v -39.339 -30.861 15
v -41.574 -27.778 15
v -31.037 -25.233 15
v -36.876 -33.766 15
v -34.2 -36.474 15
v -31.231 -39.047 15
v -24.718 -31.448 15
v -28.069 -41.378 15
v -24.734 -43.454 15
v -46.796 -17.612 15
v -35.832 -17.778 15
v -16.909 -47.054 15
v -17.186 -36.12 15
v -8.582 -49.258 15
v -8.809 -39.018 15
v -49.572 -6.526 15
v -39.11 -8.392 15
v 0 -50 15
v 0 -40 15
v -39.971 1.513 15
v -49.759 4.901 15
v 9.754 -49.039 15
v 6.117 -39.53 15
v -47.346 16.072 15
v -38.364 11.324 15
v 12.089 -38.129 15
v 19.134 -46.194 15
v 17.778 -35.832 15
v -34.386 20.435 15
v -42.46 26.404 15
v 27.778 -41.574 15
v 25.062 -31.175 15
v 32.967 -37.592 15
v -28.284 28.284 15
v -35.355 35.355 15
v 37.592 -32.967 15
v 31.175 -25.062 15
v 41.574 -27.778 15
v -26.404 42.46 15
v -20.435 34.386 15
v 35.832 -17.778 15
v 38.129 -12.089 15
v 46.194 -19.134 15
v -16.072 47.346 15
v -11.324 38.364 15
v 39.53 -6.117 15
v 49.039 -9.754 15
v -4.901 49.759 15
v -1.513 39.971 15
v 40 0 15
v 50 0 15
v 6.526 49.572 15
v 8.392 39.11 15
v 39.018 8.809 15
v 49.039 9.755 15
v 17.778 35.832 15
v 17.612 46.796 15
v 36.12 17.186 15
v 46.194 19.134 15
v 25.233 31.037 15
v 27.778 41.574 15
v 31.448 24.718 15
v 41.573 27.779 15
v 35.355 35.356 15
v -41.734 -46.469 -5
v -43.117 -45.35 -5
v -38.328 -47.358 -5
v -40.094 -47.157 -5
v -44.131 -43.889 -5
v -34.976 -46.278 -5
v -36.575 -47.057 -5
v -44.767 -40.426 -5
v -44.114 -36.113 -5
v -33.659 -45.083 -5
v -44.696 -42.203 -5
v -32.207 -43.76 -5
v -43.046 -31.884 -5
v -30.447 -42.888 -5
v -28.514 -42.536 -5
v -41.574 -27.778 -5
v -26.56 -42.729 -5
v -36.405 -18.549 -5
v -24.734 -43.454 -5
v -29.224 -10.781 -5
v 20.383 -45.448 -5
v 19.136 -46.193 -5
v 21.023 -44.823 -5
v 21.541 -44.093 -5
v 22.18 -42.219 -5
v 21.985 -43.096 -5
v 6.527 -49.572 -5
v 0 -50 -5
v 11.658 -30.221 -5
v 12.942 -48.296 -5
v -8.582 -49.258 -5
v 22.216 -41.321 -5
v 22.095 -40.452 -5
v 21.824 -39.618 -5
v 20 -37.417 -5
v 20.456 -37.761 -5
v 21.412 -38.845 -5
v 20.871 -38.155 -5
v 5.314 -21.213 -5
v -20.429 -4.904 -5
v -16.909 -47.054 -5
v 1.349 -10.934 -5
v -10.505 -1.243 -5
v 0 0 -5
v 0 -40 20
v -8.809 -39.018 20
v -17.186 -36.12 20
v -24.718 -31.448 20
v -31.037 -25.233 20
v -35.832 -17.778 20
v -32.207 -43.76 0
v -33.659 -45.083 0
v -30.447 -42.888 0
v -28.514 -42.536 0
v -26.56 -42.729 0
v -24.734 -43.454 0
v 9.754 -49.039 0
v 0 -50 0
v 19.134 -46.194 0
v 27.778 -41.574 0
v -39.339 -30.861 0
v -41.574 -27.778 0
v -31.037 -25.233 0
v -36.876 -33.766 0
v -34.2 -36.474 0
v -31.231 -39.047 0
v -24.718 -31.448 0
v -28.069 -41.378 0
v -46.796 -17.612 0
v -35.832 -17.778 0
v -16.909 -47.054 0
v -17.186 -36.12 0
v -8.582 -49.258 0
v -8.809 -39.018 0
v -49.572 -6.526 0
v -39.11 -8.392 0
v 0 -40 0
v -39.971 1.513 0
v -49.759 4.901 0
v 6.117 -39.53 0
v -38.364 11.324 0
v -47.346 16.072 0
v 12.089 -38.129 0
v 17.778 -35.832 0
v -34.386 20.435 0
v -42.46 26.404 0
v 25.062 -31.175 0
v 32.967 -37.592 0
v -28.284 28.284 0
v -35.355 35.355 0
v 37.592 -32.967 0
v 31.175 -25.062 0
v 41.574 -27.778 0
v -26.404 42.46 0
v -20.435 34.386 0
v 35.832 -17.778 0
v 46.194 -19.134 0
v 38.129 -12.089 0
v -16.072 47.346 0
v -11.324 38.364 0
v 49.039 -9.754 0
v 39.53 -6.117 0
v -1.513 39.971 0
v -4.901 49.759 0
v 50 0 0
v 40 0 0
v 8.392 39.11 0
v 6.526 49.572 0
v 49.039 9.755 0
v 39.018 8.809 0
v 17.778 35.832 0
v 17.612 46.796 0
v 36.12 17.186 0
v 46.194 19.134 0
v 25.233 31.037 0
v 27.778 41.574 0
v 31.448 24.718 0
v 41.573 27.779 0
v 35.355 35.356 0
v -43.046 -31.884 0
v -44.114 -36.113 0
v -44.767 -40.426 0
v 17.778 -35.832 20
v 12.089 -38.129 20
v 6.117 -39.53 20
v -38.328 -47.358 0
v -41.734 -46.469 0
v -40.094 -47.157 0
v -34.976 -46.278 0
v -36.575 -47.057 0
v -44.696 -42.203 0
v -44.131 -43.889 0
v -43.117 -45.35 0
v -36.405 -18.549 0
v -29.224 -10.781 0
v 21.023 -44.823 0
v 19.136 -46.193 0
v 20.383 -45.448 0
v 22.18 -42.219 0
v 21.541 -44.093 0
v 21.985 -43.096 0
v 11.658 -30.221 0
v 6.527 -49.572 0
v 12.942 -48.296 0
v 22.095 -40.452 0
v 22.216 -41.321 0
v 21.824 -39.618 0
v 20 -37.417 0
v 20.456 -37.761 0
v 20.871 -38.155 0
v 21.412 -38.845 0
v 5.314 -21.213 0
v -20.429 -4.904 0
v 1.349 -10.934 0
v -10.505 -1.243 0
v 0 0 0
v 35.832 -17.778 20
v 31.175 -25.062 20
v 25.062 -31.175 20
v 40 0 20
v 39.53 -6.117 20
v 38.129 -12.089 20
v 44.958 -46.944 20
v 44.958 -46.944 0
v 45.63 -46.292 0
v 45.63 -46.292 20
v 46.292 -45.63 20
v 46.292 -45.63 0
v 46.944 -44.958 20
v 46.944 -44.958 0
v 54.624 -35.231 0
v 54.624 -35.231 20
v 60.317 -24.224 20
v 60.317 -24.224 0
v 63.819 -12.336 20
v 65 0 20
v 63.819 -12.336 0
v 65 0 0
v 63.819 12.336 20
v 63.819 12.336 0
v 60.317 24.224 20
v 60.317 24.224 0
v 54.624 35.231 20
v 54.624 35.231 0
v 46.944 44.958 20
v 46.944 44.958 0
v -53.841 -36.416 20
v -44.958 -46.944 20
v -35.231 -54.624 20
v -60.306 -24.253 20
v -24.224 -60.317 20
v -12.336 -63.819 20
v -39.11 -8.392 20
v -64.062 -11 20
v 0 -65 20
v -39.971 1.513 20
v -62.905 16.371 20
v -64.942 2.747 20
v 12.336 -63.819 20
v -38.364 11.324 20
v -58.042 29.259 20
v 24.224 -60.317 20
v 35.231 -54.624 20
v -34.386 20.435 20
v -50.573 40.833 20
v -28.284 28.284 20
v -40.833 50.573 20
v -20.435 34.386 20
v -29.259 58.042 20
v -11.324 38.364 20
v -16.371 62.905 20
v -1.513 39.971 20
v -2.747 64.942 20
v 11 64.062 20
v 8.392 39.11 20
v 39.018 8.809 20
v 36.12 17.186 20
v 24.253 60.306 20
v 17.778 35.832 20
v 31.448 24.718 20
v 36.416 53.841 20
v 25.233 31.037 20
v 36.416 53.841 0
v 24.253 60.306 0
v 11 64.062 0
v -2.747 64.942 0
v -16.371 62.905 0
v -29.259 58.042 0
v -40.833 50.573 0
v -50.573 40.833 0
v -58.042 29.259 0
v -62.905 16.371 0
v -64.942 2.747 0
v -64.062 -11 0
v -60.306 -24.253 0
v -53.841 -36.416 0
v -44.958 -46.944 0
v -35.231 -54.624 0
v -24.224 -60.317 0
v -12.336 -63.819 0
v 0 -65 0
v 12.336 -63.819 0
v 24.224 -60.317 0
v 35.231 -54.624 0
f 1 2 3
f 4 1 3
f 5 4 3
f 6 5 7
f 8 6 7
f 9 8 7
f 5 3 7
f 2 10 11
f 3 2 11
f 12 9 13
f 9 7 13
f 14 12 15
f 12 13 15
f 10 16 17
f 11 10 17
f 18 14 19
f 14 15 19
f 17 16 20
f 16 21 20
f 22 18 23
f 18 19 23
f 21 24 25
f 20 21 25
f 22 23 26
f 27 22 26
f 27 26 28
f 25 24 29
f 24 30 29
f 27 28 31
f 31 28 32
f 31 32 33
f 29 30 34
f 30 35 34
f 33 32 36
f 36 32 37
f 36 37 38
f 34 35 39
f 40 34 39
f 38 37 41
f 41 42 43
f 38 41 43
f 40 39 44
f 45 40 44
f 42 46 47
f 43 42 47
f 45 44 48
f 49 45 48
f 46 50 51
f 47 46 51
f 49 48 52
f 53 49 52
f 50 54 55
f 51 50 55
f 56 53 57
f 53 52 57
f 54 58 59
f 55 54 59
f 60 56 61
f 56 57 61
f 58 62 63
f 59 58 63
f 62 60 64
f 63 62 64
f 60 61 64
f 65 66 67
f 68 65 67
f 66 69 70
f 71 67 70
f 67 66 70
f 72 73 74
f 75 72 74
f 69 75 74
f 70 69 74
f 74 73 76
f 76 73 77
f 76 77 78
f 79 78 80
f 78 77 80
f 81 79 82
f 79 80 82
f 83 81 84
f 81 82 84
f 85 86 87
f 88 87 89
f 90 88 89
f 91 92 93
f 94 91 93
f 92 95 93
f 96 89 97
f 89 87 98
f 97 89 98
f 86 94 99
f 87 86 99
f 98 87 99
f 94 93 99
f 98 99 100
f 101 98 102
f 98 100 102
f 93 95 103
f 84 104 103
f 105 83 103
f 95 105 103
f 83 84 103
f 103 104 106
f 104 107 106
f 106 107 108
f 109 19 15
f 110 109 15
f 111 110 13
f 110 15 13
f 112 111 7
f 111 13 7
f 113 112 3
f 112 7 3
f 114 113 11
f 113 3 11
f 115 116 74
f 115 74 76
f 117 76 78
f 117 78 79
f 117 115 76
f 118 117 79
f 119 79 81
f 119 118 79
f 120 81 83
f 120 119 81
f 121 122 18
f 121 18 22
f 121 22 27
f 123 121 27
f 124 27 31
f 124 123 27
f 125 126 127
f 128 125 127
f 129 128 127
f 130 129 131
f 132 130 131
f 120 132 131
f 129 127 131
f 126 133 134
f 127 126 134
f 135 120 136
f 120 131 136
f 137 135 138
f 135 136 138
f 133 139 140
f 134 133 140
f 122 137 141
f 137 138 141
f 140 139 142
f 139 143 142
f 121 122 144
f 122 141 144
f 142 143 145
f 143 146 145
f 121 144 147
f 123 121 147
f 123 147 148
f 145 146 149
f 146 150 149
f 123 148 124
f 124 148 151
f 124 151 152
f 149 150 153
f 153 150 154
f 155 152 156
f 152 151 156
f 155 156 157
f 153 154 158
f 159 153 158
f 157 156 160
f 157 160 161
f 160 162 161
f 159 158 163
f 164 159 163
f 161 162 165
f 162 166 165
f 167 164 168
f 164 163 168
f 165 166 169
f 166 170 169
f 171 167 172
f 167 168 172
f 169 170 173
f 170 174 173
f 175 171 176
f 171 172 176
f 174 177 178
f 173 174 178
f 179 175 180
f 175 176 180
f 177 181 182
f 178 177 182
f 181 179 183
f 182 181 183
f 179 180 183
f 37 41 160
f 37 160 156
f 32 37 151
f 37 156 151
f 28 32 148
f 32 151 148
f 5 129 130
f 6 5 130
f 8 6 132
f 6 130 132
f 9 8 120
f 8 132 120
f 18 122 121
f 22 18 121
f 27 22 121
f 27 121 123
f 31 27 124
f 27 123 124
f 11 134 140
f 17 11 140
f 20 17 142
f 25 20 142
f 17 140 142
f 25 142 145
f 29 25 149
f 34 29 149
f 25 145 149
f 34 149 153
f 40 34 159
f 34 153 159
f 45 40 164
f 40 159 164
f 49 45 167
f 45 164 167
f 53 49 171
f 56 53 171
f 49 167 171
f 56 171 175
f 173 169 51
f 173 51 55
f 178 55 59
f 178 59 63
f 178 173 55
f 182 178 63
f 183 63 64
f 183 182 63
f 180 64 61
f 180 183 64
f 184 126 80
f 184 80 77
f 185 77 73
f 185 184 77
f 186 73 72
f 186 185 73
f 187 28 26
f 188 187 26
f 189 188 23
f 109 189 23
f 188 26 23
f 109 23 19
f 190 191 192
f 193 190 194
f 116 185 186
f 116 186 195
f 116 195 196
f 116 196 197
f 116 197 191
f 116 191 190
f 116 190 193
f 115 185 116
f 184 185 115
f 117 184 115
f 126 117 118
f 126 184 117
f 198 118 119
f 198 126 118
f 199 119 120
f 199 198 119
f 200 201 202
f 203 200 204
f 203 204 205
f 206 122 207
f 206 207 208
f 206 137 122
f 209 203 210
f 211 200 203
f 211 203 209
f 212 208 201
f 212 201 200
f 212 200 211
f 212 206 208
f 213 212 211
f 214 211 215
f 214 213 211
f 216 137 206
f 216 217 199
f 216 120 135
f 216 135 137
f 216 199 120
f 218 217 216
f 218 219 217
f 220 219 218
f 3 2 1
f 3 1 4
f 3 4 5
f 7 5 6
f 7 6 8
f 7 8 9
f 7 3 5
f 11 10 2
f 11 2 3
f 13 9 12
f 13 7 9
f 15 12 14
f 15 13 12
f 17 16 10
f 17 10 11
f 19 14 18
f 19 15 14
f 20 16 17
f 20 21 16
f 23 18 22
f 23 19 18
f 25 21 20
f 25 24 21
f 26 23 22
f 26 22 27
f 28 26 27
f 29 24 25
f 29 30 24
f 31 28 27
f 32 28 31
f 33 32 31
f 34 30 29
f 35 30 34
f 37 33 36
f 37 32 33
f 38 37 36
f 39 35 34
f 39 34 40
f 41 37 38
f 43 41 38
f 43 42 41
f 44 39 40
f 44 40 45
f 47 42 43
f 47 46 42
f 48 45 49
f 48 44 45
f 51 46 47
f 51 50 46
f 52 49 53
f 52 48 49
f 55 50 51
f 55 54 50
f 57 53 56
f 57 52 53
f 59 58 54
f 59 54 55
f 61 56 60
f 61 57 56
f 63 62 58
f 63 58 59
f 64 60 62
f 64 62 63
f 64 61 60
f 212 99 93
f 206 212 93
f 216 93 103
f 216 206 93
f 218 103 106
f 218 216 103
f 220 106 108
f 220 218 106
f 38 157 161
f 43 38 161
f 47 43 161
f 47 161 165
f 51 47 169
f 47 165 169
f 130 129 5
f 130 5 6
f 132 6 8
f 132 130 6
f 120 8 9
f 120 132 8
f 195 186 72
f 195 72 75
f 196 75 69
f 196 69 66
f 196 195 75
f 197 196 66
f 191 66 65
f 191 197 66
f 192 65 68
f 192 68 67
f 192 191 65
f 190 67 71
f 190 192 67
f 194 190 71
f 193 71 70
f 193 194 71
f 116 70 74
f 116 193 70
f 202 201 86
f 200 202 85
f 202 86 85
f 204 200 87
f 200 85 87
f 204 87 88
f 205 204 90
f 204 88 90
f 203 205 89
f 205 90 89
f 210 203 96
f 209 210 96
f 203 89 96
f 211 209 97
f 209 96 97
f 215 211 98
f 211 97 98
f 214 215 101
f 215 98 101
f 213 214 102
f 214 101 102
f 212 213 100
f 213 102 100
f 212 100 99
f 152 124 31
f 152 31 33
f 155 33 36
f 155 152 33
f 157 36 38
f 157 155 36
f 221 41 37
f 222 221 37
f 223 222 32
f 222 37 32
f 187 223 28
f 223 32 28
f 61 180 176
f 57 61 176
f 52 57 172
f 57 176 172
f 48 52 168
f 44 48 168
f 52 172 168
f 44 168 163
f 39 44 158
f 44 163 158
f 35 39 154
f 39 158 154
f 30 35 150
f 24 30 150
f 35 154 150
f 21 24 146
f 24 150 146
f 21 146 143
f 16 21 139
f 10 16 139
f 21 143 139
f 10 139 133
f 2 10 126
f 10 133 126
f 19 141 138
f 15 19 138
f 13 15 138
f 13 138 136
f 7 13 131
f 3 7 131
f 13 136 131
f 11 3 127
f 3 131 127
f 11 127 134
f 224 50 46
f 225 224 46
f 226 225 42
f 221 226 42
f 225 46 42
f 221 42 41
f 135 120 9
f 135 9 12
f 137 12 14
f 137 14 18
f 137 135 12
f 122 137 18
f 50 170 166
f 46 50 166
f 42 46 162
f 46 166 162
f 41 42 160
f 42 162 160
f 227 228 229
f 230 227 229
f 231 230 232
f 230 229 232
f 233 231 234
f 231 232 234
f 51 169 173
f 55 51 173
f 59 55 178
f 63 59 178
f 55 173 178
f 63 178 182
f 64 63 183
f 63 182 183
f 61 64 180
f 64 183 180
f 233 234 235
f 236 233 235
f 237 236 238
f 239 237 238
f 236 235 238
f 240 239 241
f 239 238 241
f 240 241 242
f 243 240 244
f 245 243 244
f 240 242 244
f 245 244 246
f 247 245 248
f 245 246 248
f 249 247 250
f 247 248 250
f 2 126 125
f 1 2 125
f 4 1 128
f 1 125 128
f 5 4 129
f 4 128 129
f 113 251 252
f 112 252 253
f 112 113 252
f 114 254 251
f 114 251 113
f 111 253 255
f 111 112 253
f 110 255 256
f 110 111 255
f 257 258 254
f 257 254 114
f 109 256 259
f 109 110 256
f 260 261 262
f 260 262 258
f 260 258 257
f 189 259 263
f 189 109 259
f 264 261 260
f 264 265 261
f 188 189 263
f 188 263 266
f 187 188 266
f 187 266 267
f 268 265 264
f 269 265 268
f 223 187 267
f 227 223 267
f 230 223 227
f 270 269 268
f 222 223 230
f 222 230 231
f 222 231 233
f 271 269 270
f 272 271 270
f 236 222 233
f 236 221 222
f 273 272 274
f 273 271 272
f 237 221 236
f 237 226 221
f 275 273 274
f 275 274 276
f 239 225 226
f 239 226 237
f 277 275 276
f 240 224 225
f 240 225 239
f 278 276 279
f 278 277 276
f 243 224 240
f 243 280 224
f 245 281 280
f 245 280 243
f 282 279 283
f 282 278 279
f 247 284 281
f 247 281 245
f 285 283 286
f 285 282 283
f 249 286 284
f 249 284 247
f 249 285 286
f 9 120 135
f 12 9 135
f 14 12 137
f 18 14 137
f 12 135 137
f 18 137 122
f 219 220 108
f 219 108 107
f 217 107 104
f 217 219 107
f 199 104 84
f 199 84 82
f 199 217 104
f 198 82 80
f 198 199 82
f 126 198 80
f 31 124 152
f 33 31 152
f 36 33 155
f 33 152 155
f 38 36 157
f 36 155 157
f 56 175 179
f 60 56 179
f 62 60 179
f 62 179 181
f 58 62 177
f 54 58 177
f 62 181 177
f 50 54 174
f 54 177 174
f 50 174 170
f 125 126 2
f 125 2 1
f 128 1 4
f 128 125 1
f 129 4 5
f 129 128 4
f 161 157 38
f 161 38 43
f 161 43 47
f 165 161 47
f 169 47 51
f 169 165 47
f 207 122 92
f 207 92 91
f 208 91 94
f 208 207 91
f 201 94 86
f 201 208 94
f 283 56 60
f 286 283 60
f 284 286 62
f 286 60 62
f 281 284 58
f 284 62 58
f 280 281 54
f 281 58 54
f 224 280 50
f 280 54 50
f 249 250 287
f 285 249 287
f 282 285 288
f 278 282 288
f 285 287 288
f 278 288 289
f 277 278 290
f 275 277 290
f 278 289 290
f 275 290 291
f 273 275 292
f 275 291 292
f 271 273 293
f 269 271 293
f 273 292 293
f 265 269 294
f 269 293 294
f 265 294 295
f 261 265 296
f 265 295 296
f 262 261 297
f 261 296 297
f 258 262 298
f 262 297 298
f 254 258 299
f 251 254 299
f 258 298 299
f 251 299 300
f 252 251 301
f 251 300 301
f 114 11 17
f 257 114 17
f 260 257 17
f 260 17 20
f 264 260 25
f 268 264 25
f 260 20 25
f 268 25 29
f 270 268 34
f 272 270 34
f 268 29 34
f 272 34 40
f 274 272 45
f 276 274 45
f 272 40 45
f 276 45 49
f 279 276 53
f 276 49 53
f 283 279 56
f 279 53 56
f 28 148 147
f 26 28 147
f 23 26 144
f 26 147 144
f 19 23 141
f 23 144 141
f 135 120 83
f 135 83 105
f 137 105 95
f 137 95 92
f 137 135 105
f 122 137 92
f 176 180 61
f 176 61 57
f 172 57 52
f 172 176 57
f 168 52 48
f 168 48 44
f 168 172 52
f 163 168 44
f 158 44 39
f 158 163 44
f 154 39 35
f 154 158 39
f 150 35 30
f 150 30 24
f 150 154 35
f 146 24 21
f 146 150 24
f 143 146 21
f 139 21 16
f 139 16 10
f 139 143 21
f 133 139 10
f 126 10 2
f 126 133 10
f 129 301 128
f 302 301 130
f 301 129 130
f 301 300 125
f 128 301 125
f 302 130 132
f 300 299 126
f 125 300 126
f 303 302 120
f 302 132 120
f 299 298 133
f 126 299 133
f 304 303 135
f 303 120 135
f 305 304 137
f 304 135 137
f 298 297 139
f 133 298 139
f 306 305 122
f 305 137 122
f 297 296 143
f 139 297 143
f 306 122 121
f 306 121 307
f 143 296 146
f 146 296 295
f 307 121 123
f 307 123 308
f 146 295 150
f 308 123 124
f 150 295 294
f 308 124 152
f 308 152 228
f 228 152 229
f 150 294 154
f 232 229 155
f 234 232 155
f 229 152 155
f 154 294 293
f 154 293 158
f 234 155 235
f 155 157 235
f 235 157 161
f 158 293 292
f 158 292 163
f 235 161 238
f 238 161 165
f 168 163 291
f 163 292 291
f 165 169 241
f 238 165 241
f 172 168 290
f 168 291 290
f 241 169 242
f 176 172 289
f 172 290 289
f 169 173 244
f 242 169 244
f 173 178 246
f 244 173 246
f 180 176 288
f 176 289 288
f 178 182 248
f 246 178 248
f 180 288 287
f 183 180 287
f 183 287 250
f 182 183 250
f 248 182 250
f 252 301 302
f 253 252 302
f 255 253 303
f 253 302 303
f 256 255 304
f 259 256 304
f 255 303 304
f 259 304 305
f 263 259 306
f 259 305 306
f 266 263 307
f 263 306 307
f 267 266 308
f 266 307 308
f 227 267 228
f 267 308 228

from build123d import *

# Parameters (mm, degrees)
F1_DEPTH = 20
F2_DEPTH = 15
F3_DEPTH = 15
F4_DEPTH = 5
F5_R     = 5


# Not quite as in the source:
# - a feature names something its author has since deleted; it is built from what else it names


with BuildPart() as f1:
    # F0 (on Top) → F1 (new body)
    with BuildSketch(Plane.XY):
        with BuildLine():
            ThreePointArc((-41.5739709642, -27.7777777778), (-35.3553390593, 35.3553390593), (27.7777777778, 41.5739709642))
            ThreePointArc((27.7777777778, 41.5739709642), (37.1759673359, 44.3146083461), (46.9444444444, 44.9579707705))
            ThreePointArc((46.9444444444, 44.9579707705), (-45.9619407771, 45.9619407771), (-44.9579707705, -46.9444444444))
            ThreePointArc((-44.9579707705, -46.9444444444), (-44.9806919732, -43.6819144147), (-44.7669675939, -40.426313036))
            ThreePointArc((-44.7669675939, -40.426313036), (-43.6312477339, -33.9857264796), (-41.5739709642, -27.7777777778))
        make_face()
        with BuildLine():
            ThreePointArc((45, -45), (36.220156419, -44.1351826403), (27.7777777778, -41.5739709642))
            ThreePointArc((27.7777777778, -41.5739709642), (14.5138115564, -47.8471448898), (0, -50))
            ThreePointArc((0, -50), (-12.7926961833, -48.3357727192), (-24.7337942073, -43.4538769745))
            ThreePointArc((-24.7337942073, -43.4538769745), (-29.4930498897, -42.6445374906), (-33.6593211472, -45.0833340912))
            ThreePointArc((-33.6593211472, -45.0833340912), (-40.9388886222, -46.870964929), (-44.7669675939, -40.426313036))
            ThreePointArc((-44.7669675939, -40.426313036), (-44.9806919732, -43.6819144147), (-44.9579707705, -46.9444444444))
            ThreePointArc((-44.9579707705, -46.9444444444), (0, -65), (44.9579707705, -46.9444444444))
            ThreePointArc((44.9579707705, -46.9444444444), (44.9894914656, -45.9724493115), (45, -45))
        make_face()
        with BuildLine():
            ThreePointArc((27.7777777778, 41.5739709642), (44.0958551844, 23.5702260396), (50, 0))
            ThreePointArc((50, 0), (47.8471448898, -14.5138115564), (41.5739709642, -27.7777777778))
            ThreePointArc((41.5739709642, -27.7777777778), (44.1351826403, -36.220156419), (45, -45))
            ThreePointArc((45, -45), (45.9724493115, -44.9894914656), (46.9444444444, -44.9579707705))
            ThreePointArc((46.9444444444, -44.9579707705), (60.317447264, -24.2240697562), (65, 0))
            ThreePointArc((65, 0), (60.317447264, 24.2240697562), (46.9444444444, 44.9579707705))
            ThreePointArc((46.9444444444, 44.9579707705), (37.1759673359, 44.3146083461), (27.7777777778, 41.5739709642))
        make_face()
        with BuildLine():
            ThreePointArc((45, -45), (44.1351826403, -36.220156419), (41.5739709642, -27.7777777778))
            ThreePointArc((41.5739709642, -27.7777777778), (35.3553390593, -35.3553390593), (27.7777777778, -41.5739709642))
            ThreePointArc((27.7777777778, -41.5739709642), (36.220156419, -44.1351826403), (45, -45))
        make_face()
        with BuildLine():
            ThreePointArc((46.9444444444, -44.9579707705), (45.9724493115, -44.9894914656), (45, -45))
            ThreePointArc((45, -45), (44.9894914656, -45.9724493115), (44.9579707705, -46.9444444444))
            ThreePointArc((44.9579707705, -46.9444444444), (45.9619407771, -45.9619407771), (46.9444444444, -44.9579707705))
        make_face()
        with BuildLine():
            ThreePointArc((-35.8322566591, -17.7777777778), (-28.2842712475, 28.2842712475), (17.7777777778, 35.8322566591))
            ThreePointArc((17.7777777778, 35.8322566591), (22.5931041578, 39.0247487976), (27.7777777778, 41.5739709642))
            ThreePointArc((27.7777777778, 41.5739709642), (-35.3553390593, 35.3553390593), (-41.5739709642, -27.7777777778))
            ThreePointArc((-41.5739709642, -27.7777777778), (-39.0247487976, -22.5931041578), (-35.8322566591, -17.7777777778))
        make_face()
        with BuildLine():
            ThreePointArc((17.7777777778, 35.8322566591), (33.993463424, 21.0818510678), (40, 0))
            Line((40, 0), (50, 0))
            ThreePointArc((50, 0), (44.0958551844, 23.5702260396), (27.7777777778, 41.5739709642))
            ThreePointArc((27.7777777778, 41.5739709642), (22.5931041578, 39.0247487976), (17.7777777778, 35.8322566591))
        make_face()
        with BuildLine():
            Line((50, 0), (40, 0))
            ThreePointArc((40, 0), (38.9441283531, -9.1298886531), (35.8322566591, -17.7777777778))
            ThreePointArc((35.8322566591, -17.7777777778), (39.0247487976, -22.5931041578), (41.5739709642, -27.7777777778))
            ThreePointArc((41.5739709642, -27.7777777778), (47.8471448898, -14.5138115564), (50, 0))
        make_face()
        with BuildLine():
            ThreePointArc((41.5739709642, -27.7777777778), (39.0247487976, -22.5931041578), (35.8322566591, -17.7777777778))
            ThreePointArc((35.8322566591, -17.7777777778), (28.2842712475, -28.2842712475), (17.7777777778, -35.8322566591))
            ThreePointArc((17.7777777778, -35.8322566591), (22.5931041578, -39.0247487976), (27.7777777778, -41.5739709642))
            ThreePointArc((27.7777777778, -41.5739709642), (35.3553390593, -35.3553390593), (41.5739709642, -27.7777777778))
        make_face()
        with BuildLine():
            ThreePointArc((27.7777777778, -41.5739709642), (22.5931041578, -39.0247487976), (17.7777777778, -35.8322566591))
            ThreePointArc((17.7777777778, -35.8322566591), (9.1298886531, -38.9441283531), (0, -40))
            Line((0, -40), (0, -50))
            ThreePointArc((0, -50), (14.5138115564, -47.8471448898), (27.7777777778, -41.5739709642))
        make_face()
        with BuildLine():
            ThreePointArc((0, -40), (-21.0818510678, -33.993463424), (-35.8322566591, -17.7777777778))
            ThreePointArc((-35.8322566591, -17.7777777778), (-39.0247487976, -22.5931041578), (-41.5739709642, -27.7777777778))
            ThreePointArc((-41.5739709642, -27.7777777778), (-38.1355654332, -32.3369548518), (-34.1997389873, -36.4743451373))
            ThreePointArc((-34.1997389873, -36.4743451373), (-29.6726945164, -40.2433994605), (-24.7337942073, -43.4538769745))
            ThreePointArc((-24.7337942073, -43.4538769745), (-12.7926961833, -48.3357727192), (0, -50))
            Line((0, -50), (0, -40))
        make_face()
        with BuildLine():
            ThreePointArc((-34.1997389873, -36.4743451373), (-38.1355654332, -32.3369548518), (-41.5739709642, -27.7777777778))
            ThreePointArc((-41.5739709642, -27.7777777778), (-43.6312477339, -33.9857264796), (-44.7669675939, -40.426313036))
            ThreePointArc((-44.7669675939, -40.426313036), (-40.7099854287, -35.1704182799), (-34.1997389873, -36.4743451373))
        make_face()
        with BuildLine():
            ThreePointArc((-32.2106591377, -41.0660656442), (-32.729295856, -38.564049664), (-34.1997389873, -36.4743451373))
            ThreePointArc((-34.1997389873, -36.4743451373), (-40.7099854287, -35.1704182799), (-44.7669675939, -40.426313036))
            ThreePointArc((-44.7669675939, -40.426313036), (-40.9388886222, -46.870964929), (-33.6593211472, -45.0833340912))
            ThreePointArc((-33.6593211472, -45.0833340912), (-32.5838900439, -43.2013096228), (-32.2106591377, -41.0660656442))
        make_face()
        with BuildLine():
            ThreePointArc((-24.7337942073, -43.4538769745), (-29.6726945164, -40.2433994605), (-34.1997389873, -36.4743451373))
            ThreePointArc((-34.1997389873, -36.4743451373), (-32.729295856, -38.564049664), (-32.2106591377, -41.0660656442))
            ThreePointArc((-32.2106591377, -41.0660656442), (-32.5838900439, -43.2013096228), (-33.6593211472, -45.0833340912))
            ThreePointArc((-33.6593211472, -45.0833340912), (-29.4930498897, -42.6445374906), (-24.7337942073, -43.4538769745))
        make_face()
    extrude(amount=F1_DEPTH)

    # F0 (on Top) → F2 (cut)
    with BuildSketch(Plane.XY):
        with BuildLine():
            ThreePointArc((17.7777777778, 35.8322566591), (33.993463424, 21.0818510678), (40, 0))
            Line((40, 0), (50, 0))
            ThreePointArc((50, 0), (44.0958551844, 23.5702260396), (27.7777777778, 41.5739709642))
            ThreePointArc((27.7777777778, 41.5739709642), (22.5931041578, 39.0247487976), (17.7777777778, 35.8322566591))
        make_face()
        with BuildLine():
            Line((50, 0), (40, 0))
            ThreePointArc((40, 0), (38.9441283531, -9.1298886531), (35.8322566591, -17.7777777778))
            ThreePointArc((35.8322566591, -17.7777777778), (39.0247487976, -22.5931041578), (41.5739709642, -27.7777777778))
            ThreePointArc((41.5739709642, -27.7777777778), (47.8471448898, -14.5138115564), (50, 0))
        make_face()
        with BuildLine():
            ThreePointArc((41.5739709642, -27.7777777778), (39.0247487976, -22.5931041578), (35.8322566591, -17.7777777778))
            ThreePointArc((35.8322566591, -17.7777777778), (28.2842712475, -28.2842712475), (17.7777777778, -35.8322566591))
            ThreePointArc((17.7777777778, -35.8322566591), (22.5931041578, -39.0247487976), (27.7777777778, -41.5739709642))
            ThreePointArc((27.7777777778, -41.5739709642), (35.3553390593, -35.3553390593), (41.5739709642, -27.7777777778))
        make_face()
        with BuildLine():
            ThreePointArc((27.7777777778, -41.5739709642), (22.5931041578, -39.0247487976), (17.7777777778, -35.8322566591))
            ThreePointArc((17.7777777778, -35.8322566591), (9.1298886531, -38.9441283531), (0, -40))
            Line((0, -40), (0, -50))
            ThreePointArc((0, -50), (14.5138115564, -47.8471448898), (27.7777777778, -41.5739709642))
        make_face()
        with BuildLine():
            ThreePointArc((0, -40), (-21.0818510678, -33.993463424), (-35.8322566591, -17.7777777778))
            ThreePointArc((-35.8322566591, -17.7777777778), (-39.0247487976, -22.5931041578), (-41.5739709642, -27.7777777778))
            ThreePointArc((-41.5739709642, -27.7777777778), (-38.1355654332, -32.3369548518), (-34.1997389873, -36.4743451373))
            ThreePointArc((-34.1997389873, -36.4743451373), (-29.6726945164, -40.2433994605), (-24.7337942073, -43.4538769745))
            ThreePointArc((-24.7337942073, -43.4538769745), (-12.7926961833, -48.3357727192), (0, -50))
            Line((0, -50), (0, -40))
        make_face()
        with BuildLine():
            ThreePointArc((-35.8322566591, -17.7777777778), (-28.2842712475, 28.2842712475), (17.7777777778, 35.8322566591))
            ThreePointArc((17.7777777778, 35.8322566591), (22.5931041578, 39.0247487976), (27.7777777778, 41.5739709642))
            ThreePointArc((27.7777777778, 41.5739709642), (-35.3553390593, 35.3553390593), (-41.5739709642, -27.7777777778))
            ThreePointArc((-41.5739709642, -27.7777777778), (-39.0247487976, -22.5931041578), (-35.8322566591, -17.7777777778))
        make_face()
    extrude(amount=F2_DEPTH, mode=Mode.SUBTRACT)


with BuildPart() as f3:
    # F0 (on Top) → F3 (new body)
    with BuildSketch(Plane.XY):
        with BuildLine():
            ThreePointArc((0, -40), (-21.0818510678, -33.993463424), (-35.8322566591, -17.7777777778))
            ThreePointArc((-35.8322566591, -17.7777777778), (-39.0247487976, -22.5931041578), (-41.5739709642, -27.7777777778))
            ThreePointArc((-41.5739709642, -27.7777777778), (-38.1355654332, -32.3369548518), (-34.1997389873, -36.4743451373))
            ThreePointArc((-34.1997389873, -36.4743451373), (-29.6726945164, -40.2433994605), (-24.7337942073, -43.4538769745))
            ThreePointArc((-24.7337942073, -43.4538769745), (-12.7926961833, -48.3357727192), (0, -50))
            Line((0, -50), (0, -40))
        make_face()
        with BuildLine():
            ThreePointArc((27.7777777778, -41.5739709642), (22.5931041578, -39.0247487976), (17.7777777778, -35.8322566591))
            ThreePointArc((17.7777777778, -35.8322566591), (9.1298886531, -38.9441283531), (0, -40))
            Line((0, -40), (0, -50))
            ThreePointArc((0, -50), (14.5138115564, -47.8471448898), (27.7777777778, -41.5739709642))
        make_face()
        with BuildLine():
            ThreePointArc((41.5739709642, -27.7777777778), (39.0247487976, -22.5931041578), (35.8322566591, -17.7777777778))
            ThreePointArc((35.8322566591, -17.7777777778), (28.2842712475, -28.2842712475), (17.7777777778, -35.8322566591))
            ThreePointArc((17.7777777778, -35.8322566591), (22.5931041578, -39.0247487976), (27.7777777778, -41.5739709642))
            ThreePointArc((27.7777777778, -41.5739709642), (35.3553390593, -35.3553390593), (41.5739709642, -27.7777777778))
        make_face()
        with BuildLine():
            Line((50, 0), (40, 0))
            ThreePointArc((40, 0), (38.9441283531, -9.1298886531), (35.8322566591, -17.7777777778))
            ThreePointArc((35.8322566591, -17.7777777778), (39.0247487976, -22.5931041578), (41.5739709642, -27.7777777778))
            ThreePointArc((41.5739709642, -27.7777777778), (47.8471448898, -14.5138115564), (50, 0))
        make_face()
        with BuildLine():
            ThreePointArc((17.7777777778, 35.8322566591), (33.993463424, 21.0818510678), (40, 0))
            Line((40, 0), (50, 0))
            ThreePointArc((50, 0), (44.0958551844, 23.5702260396), (27.7777777778, 41.5739709642))
            ThreePointArc((27.7777777778, 41.5739709642), (22.5931041578, 39.0247487976), (17.7777777778, 35.8322566591))
        make_face()
        with BuildLine():
            ThreePointArc((-35.8322566591, -17.7777777778), (-28.2842712475, 28.2842712475), (17.7777777778, 35.8322566591))
            ThreePointArc((17.7777777778, 35.8322566591), (22.5931041578, 39.0247487976), (27.7777777778, 41.5739709642))
            ThreePointArc((27.7777777778, 41.5739709642), (-35.3553390593, 35.3553390593), (-41.5739709642, -27.7777777778))
            ThreePointArc((-41.5739709642, -27.7777777778), (-39.0247487976, -22.5931041578), (-35.8322566591, -17.7777777778))
        make_face()
    extrude(amount=F3_DEPTH)


with BuildPart() as f4:
    # F0 (on Top) → F4 (new body)
    with BuildSketch(Plane.XY):
        with BuildLine():
            ThreePointArc((0, 0), (-20, -4.6887112585), (-35.8322566591, -17.7777777778))
            ThreePointArc((-35.8322566591, -17.7777777778), (-21.0818510678, -33.993463424), (0, -40))
            ThreePointArc((0, -40), (9.1298886531, -38.9441283531), (17.7777777778, -35.8322566591))
            ThreePointArc((17.7777777778, -35.8322566591), (4.6887112585, -20), (0, 0))
        make_face()
        with BuildLine():
            ThreePointArc((27.7777777778, -41.5739709642), (22.5931041578, -39.0247487976), (17.7777777778, -35.8322566591))
            ThreePointArc((17.7777777778, -35.8322566591), (9.1298886531, -38.9441283531), (0, -40))
            Line((0, -40), (0, -50))
            ThreePointArc((0, -50), (14.5138115564, -47.8471448898), (27.7777777778, -41.5739709642))
        make_face()
        with BuildLine():
            ThreePointArc((0, -40), (-21.0818510678, -33.993463424), (-35.8322566591, -17.7777777778))
            ThreePointArc((-35.8322566591, -17.7777777778), (-39.0247487976, -22.5931041578), (-41.5739709642, -27.7777777778))
            ThreePointArc((-41.5739709642, -27.7777777778), (-38.1355654332, -32.3369548518), (-34.1997389873, -36.4743451373))
            ThreePointArc((-34.1997389873, -36.4743451373), (-29.6726945164, -40.2433994605), (-24.7337942073, -43.4538769745))
            ThreePointArc((-24.7337942073, -43.4538769745), (-12.7926961833, -48.3357727192), (0, -50))
            Line((0, -50), (0, -40))
        make_face()
        with BuildLine():
            ThreePointArc((-34.1997389873, -36.4743451373), (-38.1355654332, -32.3369548518), (-41.5739709642, -27.7777777778))
            ThreePointArc((-41.5739709642, -27.7777777778), (-43.6312477339, -33.9857264796), (-44.7669675939, -40.426313036))
            ThreePointArc((-44.7669675939, -40.426313036), (-40.7099854287, -35.1704182799), (-34.1997389873, -36.4743451373))
        make_face()
        with BuildLine():
            ThreePointArc((-32.2106591377, -41.0660656442), (-32.729295856, -38.564049664), (-34.1997389873, -36.4743451373))
            ThreePointArc((-34.1997389873, -36.4743451373), (-40.7099854287, -35.1704182799), (-44.7669675939, -40.426313036))
            ThreePointArc((-44.7669675939, -40.426313036), (-40.9388886222, -46.870964929), (-33.6593211472, -45.0833340912))
            ThreePointArc((-33.6593211472, -45.0833340912), (-32.5838900439, -43.2013096228), (-32.2106591377, -41.0660656442))
        make_face()
        with BuildLine():
            ThreePointArc((-24.7337942073, -43.4538769745), (-29.6726945164, -40.2433994605), (-34.1997389873, -36.4743451373))
            ThreePointArc((-34.1997389873, -36.4743451373), (-32.729295856, -38.564049664), (-32.2106591377, -41.0660656442))
            ThreePointArc((-32.2106591377, -41.0660656442), (-32.5838900439, -43.2013096228), (-33.6593211472, -45.0833340912))
            ThreePointArc((-33.6593211472, -45.0833340912), (-29.4930498897, -42.6445374906), (-24.7337942073, -43.4538769745))
        make_face()
    extrude(amount=-F4_DEPTH)

    # F5
    f5_edges = [f4.edges().sort_by_distance(p)[0] for p in [
        (27.777778, -41.573971, -2.5),
    ]]
    fillet(f5_edges, radius=F5_R)


solid = Compound([f1.part, f3.part, f4.part])
